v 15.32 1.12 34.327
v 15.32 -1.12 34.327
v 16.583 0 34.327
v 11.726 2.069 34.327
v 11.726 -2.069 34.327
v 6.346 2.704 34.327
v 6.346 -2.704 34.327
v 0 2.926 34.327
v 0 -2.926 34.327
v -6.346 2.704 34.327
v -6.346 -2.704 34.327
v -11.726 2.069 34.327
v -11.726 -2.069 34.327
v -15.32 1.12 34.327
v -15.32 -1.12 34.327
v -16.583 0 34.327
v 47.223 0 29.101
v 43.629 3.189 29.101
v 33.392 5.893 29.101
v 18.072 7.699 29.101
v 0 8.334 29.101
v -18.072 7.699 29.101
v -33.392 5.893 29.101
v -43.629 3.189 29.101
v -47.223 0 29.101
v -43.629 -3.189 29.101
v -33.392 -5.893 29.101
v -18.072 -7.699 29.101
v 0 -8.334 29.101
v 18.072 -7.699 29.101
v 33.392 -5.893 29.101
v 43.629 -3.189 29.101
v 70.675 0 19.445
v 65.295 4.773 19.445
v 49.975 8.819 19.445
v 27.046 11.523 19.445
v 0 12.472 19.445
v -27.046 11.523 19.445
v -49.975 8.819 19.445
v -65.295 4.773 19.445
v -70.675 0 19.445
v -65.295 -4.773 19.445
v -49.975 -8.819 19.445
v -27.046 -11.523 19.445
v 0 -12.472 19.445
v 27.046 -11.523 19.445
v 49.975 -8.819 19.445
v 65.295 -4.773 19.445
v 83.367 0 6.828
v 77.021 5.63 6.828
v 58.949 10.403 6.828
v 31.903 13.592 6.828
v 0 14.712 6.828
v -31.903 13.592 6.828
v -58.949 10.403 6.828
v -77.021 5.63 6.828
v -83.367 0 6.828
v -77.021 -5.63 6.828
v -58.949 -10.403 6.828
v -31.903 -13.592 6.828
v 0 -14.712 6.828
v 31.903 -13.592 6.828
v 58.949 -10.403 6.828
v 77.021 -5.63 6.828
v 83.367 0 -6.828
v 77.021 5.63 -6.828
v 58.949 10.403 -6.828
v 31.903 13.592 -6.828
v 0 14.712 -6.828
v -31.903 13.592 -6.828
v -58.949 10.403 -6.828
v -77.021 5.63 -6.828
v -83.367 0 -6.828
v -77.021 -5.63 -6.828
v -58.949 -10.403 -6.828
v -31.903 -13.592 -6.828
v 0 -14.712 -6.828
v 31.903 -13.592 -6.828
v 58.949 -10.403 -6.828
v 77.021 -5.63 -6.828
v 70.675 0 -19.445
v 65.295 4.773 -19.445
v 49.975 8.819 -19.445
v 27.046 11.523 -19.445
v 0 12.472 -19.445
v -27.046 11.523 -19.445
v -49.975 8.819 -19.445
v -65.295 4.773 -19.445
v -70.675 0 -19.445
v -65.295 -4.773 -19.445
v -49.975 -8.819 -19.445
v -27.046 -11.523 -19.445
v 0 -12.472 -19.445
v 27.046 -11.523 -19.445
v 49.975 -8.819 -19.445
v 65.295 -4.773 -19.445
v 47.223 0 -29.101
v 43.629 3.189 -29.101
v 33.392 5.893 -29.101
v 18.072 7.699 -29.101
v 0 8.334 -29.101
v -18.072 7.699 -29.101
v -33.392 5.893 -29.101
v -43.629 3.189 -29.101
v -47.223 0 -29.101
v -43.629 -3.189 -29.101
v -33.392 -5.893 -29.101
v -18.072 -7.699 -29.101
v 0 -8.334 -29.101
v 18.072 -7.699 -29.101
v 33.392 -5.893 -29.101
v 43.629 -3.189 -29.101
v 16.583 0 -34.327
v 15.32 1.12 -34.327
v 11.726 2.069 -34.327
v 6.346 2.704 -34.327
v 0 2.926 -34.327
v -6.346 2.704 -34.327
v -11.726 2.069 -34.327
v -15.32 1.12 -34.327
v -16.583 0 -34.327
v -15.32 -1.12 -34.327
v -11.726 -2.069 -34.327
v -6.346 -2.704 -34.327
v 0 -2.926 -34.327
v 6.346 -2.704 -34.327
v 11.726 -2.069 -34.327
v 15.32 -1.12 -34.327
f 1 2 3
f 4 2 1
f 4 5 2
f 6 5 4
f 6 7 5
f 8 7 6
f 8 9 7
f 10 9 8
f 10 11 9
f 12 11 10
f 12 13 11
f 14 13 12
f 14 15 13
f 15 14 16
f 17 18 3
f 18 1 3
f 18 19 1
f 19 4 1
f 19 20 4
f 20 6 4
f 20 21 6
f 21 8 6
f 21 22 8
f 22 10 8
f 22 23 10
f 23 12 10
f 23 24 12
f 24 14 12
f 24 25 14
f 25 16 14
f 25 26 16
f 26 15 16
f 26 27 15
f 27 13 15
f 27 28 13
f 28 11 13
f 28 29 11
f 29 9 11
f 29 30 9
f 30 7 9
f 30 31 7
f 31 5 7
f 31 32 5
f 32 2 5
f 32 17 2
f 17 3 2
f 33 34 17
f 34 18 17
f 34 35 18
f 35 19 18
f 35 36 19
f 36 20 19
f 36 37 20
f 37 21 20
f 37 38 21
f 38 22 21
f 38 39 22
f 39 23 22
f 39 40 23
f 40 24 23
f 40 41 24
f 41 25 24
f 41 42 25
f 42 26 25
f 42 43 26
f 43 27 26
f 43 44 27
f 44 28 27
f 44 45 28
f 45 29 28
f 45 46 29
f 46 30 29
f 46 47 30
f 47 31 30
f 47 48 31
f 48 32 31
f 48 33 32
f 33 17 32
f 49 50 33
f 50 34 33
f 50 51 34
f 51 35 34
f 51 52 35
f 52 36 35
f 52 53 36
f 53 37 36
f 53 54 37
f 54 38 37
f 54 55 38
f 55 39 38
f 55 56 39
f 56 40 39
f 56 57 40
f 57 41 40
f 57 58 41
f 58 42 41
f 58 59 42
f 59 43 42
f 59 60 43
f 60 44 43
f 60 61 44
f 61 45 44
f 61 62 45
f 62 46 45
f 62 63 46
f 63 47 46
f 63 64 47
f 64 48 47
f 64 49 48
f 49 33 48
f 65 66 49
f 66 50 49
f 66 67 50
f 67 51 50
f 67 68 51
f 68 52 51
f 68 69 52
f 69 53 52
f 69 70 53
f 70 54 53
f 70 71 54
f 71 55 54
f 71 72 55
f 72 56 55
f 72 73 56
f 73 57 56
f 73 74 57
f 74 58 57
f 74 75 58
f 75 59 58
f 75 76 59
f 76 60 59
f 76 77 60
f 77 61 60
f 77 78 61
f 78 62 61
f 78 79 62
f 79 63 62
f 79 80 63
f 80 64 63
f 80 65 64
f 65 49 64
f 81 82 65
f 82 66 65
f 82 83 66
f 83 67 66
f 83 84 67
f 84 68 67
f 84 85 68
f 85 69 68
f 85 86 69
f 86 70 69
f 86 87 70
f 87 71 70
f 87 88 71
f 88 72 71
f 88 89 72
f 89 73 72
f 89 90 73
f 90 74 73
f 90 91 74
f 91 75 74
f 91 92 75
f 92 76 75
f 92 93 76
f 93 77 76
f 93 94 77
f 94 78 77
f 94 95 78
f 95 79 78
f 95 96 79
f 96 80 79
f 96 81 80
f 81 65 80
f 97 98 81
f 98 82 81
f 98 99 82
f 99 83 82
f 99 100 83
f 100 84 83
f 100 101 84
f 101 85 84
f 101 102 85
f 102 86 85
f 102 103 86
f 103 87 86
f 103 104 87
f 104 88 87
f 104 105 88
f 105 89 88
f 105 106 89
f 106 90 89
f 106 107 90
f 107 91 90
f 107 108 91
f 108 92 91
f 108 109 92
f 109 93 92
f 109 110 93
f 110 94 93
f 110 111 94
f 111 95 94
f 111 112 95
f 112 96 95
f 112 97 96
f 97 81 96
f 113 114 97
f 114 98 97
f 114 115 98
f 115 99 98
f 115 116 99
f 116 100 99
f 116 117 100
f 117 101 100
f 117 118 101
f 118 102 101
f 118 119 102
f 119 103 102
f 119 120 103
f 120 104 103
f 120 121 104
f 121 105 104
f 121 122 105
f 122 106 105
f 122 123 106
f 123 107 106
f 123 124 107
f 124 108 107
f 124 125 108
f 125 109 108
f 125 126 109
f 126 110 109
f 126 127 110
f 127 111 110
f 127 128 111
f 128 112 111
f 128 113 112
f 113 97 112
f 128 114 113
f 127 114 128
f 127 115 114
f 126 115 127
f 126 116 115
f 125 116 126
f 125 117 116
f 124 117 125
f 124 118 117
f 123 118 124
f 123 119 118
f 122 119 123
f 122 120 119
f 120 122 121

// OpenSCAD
// Generated by SolidPython 1.0.1 on 2020-07-29 00:46:52


scale(v = [17, 3, 7]) {
	sphere(r = 5);
}
/***********************************************
*********      SolidPython code:      **********
************************************************
 
# import packages: SolidPython
from solid import *
from solid.utils import *
from itertools import chain, combinations, permutations


class Resize:

    def __init__(self, scad_file):
        self.scad_file = scad_file
        #self.scad_file = import_scad(scad_file)
        # cone/cylinder param:
        self.r1 = 0
        self.r2 = 0
        self.h = 0
        # rectangular prism param:
        self.w = 0
        self.l = 0
        # ellipse param:
        self.r = 0

    # import OpenScad code (file name corresponds to shape)


    # classify shape + parameters
    def assign(self, param1, param2, param3):
        if self.scad_file == 'cone.scad':
            self.r1 = param1
            self.r2 = param2
            self.h = param3
        elif self.scad_file == 'cylinder.scad':
            self.r1 = param1
            self.r2 = param2
            self.h = param3
        elif self.scad_file == 'rectangularPrism.scad':
            self.h = param1
            self.l = param2
            self.w = param3
        else:
            self.r = param1
            self.h = param2

    # resize parameters
    def iterate(self):
        x = range(3, 20, 2)
        i = 1
        if self.scad_file == 'cone.scad':
            tempList = list(permutations(x, 2))
            for temp in tempList:
                param1 = temp[0]
                param2 = temp[1]
                filepath = 'produced_scad_files/' + 'cone' + str(param1) + '_' + str(param2) + '_' + '.scad'
                scad_render_to_file(cylinder(h=param1, r1=param2, r2=0), filepath)

        elif self.scad_file == 'cylinder.scad':
            tempList = list(permutations(x, 3))
            for temp in tempList:
                param1 = temp[0]
                param2 = temp[1]
                filepath = 'produced_scad_files/' + 'cylinder' + str(param1) + '_' + str(param2) + '_' + '.scad'
                scad_render_to_file(cylinder(h=param1, r1=param2, r2=param2), filepath)

        elif self.scad_file == 'rectangularPrism.scad':
            tempList = list(permutations(x, 3))
            for temp in tempList:
                param1 = temp[0]
                param2 = temp[1]
                param3 = temp[2]
                filepath = 'produced_scad_files/' + 'rectangularPrism' + str(param1) + '_' + str(param2) + '_' + str(
                    param3) + '.scad'
                scad_render_to_file(cube(size=(param1, param2, param3)), filepath)

        elif self.scad_file == 'ellipse.scad':
            tempList = list(permutations(x, 4))
            for temp in tempList:
                param1 = temp[0]
                param2 = temp[1]
                param3 = temp[2]
                param4 = temp[3]
                filepath = 'produced_scad_files/' + 'ellipse' + str(param1) + '_' + str(param2) + '_' + str(param3) + '_' + str(param4) + '.scad'
                scad_render_to_file(scale([param1, param2, param3])(sphere(r=param4)), filepath)

    def render_to_scadfile(self):
        scad_render_to_file(scad, 'example.scad') 
 
************************************************/
